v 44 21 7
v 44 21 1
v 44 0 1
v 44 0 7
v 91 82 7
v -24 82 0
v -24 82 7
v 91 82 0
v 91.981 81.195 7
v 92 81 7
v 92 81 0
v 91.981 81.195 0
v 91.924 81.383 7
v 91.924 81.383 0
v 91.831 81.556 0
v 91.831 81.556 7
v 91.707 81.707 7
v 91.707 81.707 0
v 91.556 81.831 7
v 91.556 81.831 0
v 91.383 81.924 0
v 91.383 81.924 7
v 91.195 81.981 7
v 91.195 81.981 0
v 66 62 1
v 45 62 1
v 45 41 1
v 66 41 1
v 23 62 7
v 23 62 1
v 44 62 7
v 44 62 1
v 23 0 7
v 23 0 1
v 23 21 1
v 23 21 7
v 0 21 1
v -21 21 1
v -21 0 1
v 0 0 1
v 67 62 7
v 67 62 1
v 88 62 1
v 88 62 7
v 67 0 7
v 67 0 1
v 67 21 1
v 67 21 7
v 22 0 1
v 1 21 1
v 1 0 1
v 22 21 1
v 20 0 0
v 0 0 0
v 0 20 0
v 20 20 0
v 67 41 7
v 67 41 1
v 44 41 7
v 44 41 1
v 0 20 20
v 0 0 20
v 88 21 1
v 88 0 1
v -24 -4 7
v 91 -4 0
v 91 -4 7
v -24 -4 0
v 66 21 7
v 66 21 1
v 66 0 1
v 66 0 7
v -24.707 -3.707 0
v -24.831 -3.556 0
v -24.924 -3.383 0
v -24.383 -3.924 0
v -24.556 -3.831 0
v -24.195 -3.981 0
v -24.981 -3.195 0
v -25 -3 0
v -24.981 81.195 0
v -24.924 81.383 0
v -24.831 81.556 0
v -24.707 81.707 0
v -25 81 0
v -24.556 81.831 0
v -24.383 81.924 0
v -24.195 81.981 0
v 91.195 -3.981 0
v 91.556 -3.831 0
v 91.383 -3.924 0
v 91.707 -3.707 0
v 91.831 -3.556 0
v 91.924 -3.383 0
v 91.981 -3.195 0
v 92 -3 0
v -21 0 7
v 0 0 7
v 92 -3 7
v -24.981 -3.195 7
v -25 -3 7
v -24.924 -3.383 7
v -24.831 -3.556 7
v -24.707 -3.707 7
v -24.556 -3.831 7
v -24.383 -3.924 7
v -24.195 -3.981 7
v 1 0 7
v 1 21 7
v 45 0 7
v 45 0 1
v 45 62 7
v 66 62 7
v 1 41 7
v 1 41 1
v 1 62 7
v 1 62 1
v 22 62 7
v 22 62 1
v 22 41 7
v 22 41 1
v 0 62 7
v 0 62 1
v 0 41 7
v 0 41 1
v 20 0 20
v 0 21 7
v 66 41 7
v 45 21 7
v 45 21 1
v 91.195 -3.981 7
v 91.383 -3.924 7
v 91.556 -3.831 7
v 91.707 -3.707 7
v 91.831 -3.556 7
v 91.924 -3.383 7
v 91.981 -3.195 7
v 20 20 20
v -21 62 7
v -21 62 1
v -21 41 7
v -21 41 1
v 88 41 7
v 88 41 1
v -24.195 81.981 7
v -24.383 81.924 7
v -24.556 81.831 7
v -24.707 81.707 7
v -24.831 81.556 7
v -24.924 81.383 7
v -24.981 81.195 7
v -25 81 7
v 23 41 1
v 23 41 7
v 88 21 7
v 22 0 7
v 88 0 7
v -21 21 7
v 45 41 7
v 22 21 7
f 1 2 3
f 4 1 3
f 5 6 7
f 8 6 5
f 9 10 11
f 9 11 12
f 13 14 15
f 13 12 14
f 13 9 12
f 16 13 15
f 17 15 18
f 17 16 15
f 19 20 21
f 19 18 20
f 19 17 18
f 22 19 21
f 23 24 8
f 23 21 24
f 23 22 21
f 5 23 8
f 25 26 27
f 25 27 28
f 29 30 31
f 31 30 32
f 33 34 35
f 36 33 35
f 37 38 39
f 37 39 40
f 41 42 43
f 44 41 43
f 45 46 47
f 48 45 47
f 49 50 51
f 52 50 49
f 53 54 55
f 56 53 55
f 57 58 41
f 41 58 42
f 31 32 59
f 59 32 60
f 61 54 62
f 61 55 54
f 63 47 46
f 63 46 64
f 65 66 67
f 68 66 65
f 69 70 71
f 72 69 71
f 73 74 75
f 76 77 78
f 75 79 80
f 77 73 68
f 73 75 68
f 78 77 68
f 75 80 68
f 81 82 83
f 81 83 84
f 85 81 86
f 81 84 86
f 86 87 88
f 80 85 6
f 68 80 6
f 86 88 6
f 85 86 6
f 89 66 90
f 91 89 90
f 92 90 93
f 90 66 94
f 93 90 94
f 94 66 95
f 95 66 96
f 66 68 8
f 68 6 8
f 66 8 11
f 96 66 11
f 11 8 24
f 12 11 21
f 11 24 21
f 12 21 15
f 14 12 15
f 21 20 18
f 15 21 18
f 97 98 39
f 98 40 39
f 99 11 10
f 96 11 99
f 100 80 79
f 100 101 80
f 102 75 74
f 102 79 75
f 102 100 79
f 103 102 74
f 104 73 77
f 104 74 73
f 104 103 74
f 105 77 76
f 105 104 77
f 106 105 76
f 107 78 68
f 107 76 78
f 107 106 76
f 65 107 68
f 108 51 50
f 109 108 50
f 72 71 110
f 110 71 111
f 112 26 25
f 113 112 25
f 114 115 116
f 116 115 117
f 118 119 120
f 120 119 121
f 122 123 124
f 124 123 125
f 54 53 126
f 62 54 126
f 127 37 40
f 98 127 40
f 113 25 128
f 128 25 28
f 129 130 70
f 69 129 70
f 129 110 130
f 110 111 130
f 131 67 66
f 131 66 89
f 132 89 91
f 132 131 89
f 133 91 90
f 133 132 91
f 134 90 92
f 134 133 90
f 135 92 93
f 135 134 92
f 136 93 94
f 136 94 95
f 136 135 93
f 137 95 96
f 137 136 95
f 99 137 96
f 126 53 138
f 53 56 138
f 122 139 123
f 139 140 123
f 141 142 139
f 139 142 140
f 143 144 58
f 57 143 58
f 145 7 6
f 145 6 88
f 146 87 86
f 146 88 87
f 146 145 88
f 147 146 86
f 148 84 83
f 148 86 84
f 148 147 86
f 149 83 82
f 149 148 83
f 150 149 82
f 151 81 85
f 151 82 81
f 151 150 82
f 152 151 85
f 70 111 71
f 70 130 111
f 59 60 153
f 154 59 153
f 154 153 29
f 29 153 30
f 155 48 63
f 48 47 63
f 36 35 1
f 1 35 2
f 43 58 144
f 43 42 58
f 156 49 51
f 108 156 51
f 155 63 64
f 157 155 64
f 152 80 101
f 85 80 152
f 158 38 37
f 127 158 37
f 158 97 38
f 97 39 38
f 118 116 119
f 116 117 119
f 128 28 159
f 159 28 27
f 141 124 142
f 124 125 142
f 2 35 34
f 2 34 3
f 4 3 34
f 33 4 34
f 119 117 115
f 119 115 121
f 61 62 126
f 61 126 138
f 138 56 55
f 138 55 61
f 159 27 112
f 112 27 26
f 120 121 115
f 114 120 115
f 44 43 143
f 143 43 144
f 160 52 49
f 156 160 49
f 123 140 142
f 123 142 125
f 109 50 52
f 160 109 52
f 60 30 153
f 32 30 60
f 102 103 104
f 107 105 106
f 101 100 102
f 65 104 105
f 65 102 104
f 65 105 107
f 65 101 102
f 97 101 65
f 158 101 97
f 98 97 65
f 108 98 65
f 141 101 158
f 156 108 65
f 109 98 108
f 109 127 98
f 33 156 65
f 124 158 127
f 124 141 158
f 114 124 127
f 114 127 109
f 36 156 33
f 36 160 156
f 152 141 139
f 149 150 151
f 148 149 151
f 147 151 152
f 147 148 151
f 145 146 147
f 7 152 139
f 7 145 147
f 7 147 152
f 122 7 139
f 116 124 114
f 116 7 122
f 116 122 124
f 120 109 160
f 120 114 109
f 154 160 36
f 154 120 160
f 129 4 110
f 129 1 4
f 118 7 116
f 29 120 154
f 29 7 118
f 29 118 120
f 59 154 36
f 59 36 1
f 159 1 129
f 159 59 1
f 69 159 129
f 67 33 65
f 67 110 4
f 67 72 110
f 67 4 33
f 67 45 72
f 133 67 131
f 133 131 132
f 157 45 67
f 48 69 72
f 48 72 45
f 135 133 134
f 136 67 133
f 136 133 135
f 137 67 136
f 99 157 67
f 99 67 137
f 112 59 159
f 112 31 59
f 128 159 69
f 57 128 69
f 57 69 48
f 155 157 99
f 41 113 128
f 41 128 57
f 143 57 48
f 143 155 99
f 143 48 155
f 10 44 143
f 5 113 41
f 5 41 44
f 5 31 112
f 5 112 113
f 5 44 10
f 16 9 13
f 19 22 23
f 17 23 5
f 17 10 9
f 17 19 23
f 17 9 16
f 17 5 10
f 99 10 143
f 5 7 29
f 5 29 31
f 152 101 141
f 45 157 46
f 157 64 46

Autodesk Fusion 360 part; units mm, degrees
box "BoxPrimitive1" add length 20 width 20 height 20 placed x (0, 1, 0) y (-1, 0, 0) z (0, 0, 1) at (20, 0, 0) makes body 1 in component "20x20 Cube"
sketch "Sketch1" plane through (0, 0, 0) normal (0, 0, 1) x (1, 0, 0) in component "Cube Holder"
  line L0 (0, 0) -> (-21, 0)
  line L1 (-21, 0) -> (-21, 21)
  line L2 (-21, 21) -> (0, 21)
  line L3 (0, 21) -> (0, 0)
  line L4 (22, 0) -> (1, 0)
  line L5 (1, 0) -> (1, 21)
  line L6 (1, 21) -> (22, 21)
  line L7 (22, 21) -> (22, 0)
  line L8 (44, 0) -> (23, 0)
  line L9 (23, 0) -> (23, 21)
  line L10 (23, 21) -> (44, 21)
  line L11 (44, 21) -> (44, 0)
  line L12 (66, 0) -> (45, 0)
  line L13 (45, 0) -> (45, 21)
  line L14 (45, 21) -> (66, 21)
  line L15 (66, 21) -> (66, 0)
  line L16 (88, 0) -> (67, 0)
  line L17 (67, 0) -> (67, 21)
  line L18 (67, 21) -> (88, 21)
  line L19 (88, 21) -> (88, 0)
  line L20 (0, 41) -> (-21, 41)
  line L21 (-21, 41) -> (-21, 62)
  line L22 (-21, 62) -> (0, 62)
  line L23 (0, 62) -> (0, 41)
  line L24 (22, 41) -> (1, 41)
  line L25 (1, 41) -> (1, 62)
  line L26 (1, 62) -> (22, 62)
  line L27 (22, 62) -> (22, 41)
  line L28 (44, 41) -> (23, 41)
  line L29 (23, 41) -> (23, 62)
  line L30 (23, 62) -> (44, 62)
  line L31 (44, 62) -> (44, 41)
  line L32 (66, 41) -> (45, 41)
  line L33 (45, 41) -> (45, 62)
  line L34 (45, 62) -> (66, 62)
  line L35 (66, 62) -> (66, 41)
  line L36 (88, 41) -> (67, 41)
  line L37 (67, 41) -> (67, 62)
  line L38 (67, 62) -> (88, 62)
  line L39 (88, 62) -> (88, 41)
  line L40 (92, -4) -> (-25, -4)
  line L41 (-25, -4) -> (-25, 82)
  line L42 (-25, 82) -> (92, 82)
  line L43 (92, 82) -> (92, -4)
  dimension "d8" = 21
  dimension "d9" = 21
  dimension "d12" = 22
  dimension "d13" = 41
  dimension "d14" = 4
  dimension "d15" = 4
  dimension "d16" = 20
  dimension "d17" = 20
  dimension "d18" = 4
extrude "Extrude1" add sketch "Sketch1" along normal blind 1 separate body contours L0 L1 L2 L3 | L4 L5 L6 L7 | L8 L9 L10 L11 | L12 L13 L14 L15 | L16 L17 L18 L19 | L20 L21 L22 L23 | L24 L25 L26 L27 | L28 L29 L30 L31 | L32 L33 L34 L35 | L36 L37 L38 L39 makes body 2 at (30, 48, 0) makes body 3 at (52, 7, 0) makes body 4 at (-7, 7, 0) makes body 5 at (74, 7, 0) makes body 6 at (15, 48, 0) makes body 7 at (52, 48, 0) makes body 8 at (37, 14, 0) makes body 9 at (8, 7, 0) makes body 10 at (74, 48, 0) makes body 11 at (-7, 48, 0) in component "Cube Holder"
extrude "Extrude2" add sketch "Sketch1" along normal blind 7 bodies 2 3 4 5 6 7 8 9 10 11 in component "Cube Holder"
fillet "Fillet1" radius 1 4 edges at (92, -4, 3.5) (-25, -4, 3.5) (-25, 82, 3.5) (92, 82, 3.5) on bodies 2 in component "Cube Holder"
component "20x20 Cube" placed x (1, 0, 0) y (0, 1, 0) z (0, 0, 1) at (0, 0, 0)
component "Cube Holder" placed x (1, 0, 0) y (0, 1, 0) z (0, 0, 1) at (0, 0, 0)
equation "d14 = d15"
equation "d17 = d16"
equation "d18 = d15"
